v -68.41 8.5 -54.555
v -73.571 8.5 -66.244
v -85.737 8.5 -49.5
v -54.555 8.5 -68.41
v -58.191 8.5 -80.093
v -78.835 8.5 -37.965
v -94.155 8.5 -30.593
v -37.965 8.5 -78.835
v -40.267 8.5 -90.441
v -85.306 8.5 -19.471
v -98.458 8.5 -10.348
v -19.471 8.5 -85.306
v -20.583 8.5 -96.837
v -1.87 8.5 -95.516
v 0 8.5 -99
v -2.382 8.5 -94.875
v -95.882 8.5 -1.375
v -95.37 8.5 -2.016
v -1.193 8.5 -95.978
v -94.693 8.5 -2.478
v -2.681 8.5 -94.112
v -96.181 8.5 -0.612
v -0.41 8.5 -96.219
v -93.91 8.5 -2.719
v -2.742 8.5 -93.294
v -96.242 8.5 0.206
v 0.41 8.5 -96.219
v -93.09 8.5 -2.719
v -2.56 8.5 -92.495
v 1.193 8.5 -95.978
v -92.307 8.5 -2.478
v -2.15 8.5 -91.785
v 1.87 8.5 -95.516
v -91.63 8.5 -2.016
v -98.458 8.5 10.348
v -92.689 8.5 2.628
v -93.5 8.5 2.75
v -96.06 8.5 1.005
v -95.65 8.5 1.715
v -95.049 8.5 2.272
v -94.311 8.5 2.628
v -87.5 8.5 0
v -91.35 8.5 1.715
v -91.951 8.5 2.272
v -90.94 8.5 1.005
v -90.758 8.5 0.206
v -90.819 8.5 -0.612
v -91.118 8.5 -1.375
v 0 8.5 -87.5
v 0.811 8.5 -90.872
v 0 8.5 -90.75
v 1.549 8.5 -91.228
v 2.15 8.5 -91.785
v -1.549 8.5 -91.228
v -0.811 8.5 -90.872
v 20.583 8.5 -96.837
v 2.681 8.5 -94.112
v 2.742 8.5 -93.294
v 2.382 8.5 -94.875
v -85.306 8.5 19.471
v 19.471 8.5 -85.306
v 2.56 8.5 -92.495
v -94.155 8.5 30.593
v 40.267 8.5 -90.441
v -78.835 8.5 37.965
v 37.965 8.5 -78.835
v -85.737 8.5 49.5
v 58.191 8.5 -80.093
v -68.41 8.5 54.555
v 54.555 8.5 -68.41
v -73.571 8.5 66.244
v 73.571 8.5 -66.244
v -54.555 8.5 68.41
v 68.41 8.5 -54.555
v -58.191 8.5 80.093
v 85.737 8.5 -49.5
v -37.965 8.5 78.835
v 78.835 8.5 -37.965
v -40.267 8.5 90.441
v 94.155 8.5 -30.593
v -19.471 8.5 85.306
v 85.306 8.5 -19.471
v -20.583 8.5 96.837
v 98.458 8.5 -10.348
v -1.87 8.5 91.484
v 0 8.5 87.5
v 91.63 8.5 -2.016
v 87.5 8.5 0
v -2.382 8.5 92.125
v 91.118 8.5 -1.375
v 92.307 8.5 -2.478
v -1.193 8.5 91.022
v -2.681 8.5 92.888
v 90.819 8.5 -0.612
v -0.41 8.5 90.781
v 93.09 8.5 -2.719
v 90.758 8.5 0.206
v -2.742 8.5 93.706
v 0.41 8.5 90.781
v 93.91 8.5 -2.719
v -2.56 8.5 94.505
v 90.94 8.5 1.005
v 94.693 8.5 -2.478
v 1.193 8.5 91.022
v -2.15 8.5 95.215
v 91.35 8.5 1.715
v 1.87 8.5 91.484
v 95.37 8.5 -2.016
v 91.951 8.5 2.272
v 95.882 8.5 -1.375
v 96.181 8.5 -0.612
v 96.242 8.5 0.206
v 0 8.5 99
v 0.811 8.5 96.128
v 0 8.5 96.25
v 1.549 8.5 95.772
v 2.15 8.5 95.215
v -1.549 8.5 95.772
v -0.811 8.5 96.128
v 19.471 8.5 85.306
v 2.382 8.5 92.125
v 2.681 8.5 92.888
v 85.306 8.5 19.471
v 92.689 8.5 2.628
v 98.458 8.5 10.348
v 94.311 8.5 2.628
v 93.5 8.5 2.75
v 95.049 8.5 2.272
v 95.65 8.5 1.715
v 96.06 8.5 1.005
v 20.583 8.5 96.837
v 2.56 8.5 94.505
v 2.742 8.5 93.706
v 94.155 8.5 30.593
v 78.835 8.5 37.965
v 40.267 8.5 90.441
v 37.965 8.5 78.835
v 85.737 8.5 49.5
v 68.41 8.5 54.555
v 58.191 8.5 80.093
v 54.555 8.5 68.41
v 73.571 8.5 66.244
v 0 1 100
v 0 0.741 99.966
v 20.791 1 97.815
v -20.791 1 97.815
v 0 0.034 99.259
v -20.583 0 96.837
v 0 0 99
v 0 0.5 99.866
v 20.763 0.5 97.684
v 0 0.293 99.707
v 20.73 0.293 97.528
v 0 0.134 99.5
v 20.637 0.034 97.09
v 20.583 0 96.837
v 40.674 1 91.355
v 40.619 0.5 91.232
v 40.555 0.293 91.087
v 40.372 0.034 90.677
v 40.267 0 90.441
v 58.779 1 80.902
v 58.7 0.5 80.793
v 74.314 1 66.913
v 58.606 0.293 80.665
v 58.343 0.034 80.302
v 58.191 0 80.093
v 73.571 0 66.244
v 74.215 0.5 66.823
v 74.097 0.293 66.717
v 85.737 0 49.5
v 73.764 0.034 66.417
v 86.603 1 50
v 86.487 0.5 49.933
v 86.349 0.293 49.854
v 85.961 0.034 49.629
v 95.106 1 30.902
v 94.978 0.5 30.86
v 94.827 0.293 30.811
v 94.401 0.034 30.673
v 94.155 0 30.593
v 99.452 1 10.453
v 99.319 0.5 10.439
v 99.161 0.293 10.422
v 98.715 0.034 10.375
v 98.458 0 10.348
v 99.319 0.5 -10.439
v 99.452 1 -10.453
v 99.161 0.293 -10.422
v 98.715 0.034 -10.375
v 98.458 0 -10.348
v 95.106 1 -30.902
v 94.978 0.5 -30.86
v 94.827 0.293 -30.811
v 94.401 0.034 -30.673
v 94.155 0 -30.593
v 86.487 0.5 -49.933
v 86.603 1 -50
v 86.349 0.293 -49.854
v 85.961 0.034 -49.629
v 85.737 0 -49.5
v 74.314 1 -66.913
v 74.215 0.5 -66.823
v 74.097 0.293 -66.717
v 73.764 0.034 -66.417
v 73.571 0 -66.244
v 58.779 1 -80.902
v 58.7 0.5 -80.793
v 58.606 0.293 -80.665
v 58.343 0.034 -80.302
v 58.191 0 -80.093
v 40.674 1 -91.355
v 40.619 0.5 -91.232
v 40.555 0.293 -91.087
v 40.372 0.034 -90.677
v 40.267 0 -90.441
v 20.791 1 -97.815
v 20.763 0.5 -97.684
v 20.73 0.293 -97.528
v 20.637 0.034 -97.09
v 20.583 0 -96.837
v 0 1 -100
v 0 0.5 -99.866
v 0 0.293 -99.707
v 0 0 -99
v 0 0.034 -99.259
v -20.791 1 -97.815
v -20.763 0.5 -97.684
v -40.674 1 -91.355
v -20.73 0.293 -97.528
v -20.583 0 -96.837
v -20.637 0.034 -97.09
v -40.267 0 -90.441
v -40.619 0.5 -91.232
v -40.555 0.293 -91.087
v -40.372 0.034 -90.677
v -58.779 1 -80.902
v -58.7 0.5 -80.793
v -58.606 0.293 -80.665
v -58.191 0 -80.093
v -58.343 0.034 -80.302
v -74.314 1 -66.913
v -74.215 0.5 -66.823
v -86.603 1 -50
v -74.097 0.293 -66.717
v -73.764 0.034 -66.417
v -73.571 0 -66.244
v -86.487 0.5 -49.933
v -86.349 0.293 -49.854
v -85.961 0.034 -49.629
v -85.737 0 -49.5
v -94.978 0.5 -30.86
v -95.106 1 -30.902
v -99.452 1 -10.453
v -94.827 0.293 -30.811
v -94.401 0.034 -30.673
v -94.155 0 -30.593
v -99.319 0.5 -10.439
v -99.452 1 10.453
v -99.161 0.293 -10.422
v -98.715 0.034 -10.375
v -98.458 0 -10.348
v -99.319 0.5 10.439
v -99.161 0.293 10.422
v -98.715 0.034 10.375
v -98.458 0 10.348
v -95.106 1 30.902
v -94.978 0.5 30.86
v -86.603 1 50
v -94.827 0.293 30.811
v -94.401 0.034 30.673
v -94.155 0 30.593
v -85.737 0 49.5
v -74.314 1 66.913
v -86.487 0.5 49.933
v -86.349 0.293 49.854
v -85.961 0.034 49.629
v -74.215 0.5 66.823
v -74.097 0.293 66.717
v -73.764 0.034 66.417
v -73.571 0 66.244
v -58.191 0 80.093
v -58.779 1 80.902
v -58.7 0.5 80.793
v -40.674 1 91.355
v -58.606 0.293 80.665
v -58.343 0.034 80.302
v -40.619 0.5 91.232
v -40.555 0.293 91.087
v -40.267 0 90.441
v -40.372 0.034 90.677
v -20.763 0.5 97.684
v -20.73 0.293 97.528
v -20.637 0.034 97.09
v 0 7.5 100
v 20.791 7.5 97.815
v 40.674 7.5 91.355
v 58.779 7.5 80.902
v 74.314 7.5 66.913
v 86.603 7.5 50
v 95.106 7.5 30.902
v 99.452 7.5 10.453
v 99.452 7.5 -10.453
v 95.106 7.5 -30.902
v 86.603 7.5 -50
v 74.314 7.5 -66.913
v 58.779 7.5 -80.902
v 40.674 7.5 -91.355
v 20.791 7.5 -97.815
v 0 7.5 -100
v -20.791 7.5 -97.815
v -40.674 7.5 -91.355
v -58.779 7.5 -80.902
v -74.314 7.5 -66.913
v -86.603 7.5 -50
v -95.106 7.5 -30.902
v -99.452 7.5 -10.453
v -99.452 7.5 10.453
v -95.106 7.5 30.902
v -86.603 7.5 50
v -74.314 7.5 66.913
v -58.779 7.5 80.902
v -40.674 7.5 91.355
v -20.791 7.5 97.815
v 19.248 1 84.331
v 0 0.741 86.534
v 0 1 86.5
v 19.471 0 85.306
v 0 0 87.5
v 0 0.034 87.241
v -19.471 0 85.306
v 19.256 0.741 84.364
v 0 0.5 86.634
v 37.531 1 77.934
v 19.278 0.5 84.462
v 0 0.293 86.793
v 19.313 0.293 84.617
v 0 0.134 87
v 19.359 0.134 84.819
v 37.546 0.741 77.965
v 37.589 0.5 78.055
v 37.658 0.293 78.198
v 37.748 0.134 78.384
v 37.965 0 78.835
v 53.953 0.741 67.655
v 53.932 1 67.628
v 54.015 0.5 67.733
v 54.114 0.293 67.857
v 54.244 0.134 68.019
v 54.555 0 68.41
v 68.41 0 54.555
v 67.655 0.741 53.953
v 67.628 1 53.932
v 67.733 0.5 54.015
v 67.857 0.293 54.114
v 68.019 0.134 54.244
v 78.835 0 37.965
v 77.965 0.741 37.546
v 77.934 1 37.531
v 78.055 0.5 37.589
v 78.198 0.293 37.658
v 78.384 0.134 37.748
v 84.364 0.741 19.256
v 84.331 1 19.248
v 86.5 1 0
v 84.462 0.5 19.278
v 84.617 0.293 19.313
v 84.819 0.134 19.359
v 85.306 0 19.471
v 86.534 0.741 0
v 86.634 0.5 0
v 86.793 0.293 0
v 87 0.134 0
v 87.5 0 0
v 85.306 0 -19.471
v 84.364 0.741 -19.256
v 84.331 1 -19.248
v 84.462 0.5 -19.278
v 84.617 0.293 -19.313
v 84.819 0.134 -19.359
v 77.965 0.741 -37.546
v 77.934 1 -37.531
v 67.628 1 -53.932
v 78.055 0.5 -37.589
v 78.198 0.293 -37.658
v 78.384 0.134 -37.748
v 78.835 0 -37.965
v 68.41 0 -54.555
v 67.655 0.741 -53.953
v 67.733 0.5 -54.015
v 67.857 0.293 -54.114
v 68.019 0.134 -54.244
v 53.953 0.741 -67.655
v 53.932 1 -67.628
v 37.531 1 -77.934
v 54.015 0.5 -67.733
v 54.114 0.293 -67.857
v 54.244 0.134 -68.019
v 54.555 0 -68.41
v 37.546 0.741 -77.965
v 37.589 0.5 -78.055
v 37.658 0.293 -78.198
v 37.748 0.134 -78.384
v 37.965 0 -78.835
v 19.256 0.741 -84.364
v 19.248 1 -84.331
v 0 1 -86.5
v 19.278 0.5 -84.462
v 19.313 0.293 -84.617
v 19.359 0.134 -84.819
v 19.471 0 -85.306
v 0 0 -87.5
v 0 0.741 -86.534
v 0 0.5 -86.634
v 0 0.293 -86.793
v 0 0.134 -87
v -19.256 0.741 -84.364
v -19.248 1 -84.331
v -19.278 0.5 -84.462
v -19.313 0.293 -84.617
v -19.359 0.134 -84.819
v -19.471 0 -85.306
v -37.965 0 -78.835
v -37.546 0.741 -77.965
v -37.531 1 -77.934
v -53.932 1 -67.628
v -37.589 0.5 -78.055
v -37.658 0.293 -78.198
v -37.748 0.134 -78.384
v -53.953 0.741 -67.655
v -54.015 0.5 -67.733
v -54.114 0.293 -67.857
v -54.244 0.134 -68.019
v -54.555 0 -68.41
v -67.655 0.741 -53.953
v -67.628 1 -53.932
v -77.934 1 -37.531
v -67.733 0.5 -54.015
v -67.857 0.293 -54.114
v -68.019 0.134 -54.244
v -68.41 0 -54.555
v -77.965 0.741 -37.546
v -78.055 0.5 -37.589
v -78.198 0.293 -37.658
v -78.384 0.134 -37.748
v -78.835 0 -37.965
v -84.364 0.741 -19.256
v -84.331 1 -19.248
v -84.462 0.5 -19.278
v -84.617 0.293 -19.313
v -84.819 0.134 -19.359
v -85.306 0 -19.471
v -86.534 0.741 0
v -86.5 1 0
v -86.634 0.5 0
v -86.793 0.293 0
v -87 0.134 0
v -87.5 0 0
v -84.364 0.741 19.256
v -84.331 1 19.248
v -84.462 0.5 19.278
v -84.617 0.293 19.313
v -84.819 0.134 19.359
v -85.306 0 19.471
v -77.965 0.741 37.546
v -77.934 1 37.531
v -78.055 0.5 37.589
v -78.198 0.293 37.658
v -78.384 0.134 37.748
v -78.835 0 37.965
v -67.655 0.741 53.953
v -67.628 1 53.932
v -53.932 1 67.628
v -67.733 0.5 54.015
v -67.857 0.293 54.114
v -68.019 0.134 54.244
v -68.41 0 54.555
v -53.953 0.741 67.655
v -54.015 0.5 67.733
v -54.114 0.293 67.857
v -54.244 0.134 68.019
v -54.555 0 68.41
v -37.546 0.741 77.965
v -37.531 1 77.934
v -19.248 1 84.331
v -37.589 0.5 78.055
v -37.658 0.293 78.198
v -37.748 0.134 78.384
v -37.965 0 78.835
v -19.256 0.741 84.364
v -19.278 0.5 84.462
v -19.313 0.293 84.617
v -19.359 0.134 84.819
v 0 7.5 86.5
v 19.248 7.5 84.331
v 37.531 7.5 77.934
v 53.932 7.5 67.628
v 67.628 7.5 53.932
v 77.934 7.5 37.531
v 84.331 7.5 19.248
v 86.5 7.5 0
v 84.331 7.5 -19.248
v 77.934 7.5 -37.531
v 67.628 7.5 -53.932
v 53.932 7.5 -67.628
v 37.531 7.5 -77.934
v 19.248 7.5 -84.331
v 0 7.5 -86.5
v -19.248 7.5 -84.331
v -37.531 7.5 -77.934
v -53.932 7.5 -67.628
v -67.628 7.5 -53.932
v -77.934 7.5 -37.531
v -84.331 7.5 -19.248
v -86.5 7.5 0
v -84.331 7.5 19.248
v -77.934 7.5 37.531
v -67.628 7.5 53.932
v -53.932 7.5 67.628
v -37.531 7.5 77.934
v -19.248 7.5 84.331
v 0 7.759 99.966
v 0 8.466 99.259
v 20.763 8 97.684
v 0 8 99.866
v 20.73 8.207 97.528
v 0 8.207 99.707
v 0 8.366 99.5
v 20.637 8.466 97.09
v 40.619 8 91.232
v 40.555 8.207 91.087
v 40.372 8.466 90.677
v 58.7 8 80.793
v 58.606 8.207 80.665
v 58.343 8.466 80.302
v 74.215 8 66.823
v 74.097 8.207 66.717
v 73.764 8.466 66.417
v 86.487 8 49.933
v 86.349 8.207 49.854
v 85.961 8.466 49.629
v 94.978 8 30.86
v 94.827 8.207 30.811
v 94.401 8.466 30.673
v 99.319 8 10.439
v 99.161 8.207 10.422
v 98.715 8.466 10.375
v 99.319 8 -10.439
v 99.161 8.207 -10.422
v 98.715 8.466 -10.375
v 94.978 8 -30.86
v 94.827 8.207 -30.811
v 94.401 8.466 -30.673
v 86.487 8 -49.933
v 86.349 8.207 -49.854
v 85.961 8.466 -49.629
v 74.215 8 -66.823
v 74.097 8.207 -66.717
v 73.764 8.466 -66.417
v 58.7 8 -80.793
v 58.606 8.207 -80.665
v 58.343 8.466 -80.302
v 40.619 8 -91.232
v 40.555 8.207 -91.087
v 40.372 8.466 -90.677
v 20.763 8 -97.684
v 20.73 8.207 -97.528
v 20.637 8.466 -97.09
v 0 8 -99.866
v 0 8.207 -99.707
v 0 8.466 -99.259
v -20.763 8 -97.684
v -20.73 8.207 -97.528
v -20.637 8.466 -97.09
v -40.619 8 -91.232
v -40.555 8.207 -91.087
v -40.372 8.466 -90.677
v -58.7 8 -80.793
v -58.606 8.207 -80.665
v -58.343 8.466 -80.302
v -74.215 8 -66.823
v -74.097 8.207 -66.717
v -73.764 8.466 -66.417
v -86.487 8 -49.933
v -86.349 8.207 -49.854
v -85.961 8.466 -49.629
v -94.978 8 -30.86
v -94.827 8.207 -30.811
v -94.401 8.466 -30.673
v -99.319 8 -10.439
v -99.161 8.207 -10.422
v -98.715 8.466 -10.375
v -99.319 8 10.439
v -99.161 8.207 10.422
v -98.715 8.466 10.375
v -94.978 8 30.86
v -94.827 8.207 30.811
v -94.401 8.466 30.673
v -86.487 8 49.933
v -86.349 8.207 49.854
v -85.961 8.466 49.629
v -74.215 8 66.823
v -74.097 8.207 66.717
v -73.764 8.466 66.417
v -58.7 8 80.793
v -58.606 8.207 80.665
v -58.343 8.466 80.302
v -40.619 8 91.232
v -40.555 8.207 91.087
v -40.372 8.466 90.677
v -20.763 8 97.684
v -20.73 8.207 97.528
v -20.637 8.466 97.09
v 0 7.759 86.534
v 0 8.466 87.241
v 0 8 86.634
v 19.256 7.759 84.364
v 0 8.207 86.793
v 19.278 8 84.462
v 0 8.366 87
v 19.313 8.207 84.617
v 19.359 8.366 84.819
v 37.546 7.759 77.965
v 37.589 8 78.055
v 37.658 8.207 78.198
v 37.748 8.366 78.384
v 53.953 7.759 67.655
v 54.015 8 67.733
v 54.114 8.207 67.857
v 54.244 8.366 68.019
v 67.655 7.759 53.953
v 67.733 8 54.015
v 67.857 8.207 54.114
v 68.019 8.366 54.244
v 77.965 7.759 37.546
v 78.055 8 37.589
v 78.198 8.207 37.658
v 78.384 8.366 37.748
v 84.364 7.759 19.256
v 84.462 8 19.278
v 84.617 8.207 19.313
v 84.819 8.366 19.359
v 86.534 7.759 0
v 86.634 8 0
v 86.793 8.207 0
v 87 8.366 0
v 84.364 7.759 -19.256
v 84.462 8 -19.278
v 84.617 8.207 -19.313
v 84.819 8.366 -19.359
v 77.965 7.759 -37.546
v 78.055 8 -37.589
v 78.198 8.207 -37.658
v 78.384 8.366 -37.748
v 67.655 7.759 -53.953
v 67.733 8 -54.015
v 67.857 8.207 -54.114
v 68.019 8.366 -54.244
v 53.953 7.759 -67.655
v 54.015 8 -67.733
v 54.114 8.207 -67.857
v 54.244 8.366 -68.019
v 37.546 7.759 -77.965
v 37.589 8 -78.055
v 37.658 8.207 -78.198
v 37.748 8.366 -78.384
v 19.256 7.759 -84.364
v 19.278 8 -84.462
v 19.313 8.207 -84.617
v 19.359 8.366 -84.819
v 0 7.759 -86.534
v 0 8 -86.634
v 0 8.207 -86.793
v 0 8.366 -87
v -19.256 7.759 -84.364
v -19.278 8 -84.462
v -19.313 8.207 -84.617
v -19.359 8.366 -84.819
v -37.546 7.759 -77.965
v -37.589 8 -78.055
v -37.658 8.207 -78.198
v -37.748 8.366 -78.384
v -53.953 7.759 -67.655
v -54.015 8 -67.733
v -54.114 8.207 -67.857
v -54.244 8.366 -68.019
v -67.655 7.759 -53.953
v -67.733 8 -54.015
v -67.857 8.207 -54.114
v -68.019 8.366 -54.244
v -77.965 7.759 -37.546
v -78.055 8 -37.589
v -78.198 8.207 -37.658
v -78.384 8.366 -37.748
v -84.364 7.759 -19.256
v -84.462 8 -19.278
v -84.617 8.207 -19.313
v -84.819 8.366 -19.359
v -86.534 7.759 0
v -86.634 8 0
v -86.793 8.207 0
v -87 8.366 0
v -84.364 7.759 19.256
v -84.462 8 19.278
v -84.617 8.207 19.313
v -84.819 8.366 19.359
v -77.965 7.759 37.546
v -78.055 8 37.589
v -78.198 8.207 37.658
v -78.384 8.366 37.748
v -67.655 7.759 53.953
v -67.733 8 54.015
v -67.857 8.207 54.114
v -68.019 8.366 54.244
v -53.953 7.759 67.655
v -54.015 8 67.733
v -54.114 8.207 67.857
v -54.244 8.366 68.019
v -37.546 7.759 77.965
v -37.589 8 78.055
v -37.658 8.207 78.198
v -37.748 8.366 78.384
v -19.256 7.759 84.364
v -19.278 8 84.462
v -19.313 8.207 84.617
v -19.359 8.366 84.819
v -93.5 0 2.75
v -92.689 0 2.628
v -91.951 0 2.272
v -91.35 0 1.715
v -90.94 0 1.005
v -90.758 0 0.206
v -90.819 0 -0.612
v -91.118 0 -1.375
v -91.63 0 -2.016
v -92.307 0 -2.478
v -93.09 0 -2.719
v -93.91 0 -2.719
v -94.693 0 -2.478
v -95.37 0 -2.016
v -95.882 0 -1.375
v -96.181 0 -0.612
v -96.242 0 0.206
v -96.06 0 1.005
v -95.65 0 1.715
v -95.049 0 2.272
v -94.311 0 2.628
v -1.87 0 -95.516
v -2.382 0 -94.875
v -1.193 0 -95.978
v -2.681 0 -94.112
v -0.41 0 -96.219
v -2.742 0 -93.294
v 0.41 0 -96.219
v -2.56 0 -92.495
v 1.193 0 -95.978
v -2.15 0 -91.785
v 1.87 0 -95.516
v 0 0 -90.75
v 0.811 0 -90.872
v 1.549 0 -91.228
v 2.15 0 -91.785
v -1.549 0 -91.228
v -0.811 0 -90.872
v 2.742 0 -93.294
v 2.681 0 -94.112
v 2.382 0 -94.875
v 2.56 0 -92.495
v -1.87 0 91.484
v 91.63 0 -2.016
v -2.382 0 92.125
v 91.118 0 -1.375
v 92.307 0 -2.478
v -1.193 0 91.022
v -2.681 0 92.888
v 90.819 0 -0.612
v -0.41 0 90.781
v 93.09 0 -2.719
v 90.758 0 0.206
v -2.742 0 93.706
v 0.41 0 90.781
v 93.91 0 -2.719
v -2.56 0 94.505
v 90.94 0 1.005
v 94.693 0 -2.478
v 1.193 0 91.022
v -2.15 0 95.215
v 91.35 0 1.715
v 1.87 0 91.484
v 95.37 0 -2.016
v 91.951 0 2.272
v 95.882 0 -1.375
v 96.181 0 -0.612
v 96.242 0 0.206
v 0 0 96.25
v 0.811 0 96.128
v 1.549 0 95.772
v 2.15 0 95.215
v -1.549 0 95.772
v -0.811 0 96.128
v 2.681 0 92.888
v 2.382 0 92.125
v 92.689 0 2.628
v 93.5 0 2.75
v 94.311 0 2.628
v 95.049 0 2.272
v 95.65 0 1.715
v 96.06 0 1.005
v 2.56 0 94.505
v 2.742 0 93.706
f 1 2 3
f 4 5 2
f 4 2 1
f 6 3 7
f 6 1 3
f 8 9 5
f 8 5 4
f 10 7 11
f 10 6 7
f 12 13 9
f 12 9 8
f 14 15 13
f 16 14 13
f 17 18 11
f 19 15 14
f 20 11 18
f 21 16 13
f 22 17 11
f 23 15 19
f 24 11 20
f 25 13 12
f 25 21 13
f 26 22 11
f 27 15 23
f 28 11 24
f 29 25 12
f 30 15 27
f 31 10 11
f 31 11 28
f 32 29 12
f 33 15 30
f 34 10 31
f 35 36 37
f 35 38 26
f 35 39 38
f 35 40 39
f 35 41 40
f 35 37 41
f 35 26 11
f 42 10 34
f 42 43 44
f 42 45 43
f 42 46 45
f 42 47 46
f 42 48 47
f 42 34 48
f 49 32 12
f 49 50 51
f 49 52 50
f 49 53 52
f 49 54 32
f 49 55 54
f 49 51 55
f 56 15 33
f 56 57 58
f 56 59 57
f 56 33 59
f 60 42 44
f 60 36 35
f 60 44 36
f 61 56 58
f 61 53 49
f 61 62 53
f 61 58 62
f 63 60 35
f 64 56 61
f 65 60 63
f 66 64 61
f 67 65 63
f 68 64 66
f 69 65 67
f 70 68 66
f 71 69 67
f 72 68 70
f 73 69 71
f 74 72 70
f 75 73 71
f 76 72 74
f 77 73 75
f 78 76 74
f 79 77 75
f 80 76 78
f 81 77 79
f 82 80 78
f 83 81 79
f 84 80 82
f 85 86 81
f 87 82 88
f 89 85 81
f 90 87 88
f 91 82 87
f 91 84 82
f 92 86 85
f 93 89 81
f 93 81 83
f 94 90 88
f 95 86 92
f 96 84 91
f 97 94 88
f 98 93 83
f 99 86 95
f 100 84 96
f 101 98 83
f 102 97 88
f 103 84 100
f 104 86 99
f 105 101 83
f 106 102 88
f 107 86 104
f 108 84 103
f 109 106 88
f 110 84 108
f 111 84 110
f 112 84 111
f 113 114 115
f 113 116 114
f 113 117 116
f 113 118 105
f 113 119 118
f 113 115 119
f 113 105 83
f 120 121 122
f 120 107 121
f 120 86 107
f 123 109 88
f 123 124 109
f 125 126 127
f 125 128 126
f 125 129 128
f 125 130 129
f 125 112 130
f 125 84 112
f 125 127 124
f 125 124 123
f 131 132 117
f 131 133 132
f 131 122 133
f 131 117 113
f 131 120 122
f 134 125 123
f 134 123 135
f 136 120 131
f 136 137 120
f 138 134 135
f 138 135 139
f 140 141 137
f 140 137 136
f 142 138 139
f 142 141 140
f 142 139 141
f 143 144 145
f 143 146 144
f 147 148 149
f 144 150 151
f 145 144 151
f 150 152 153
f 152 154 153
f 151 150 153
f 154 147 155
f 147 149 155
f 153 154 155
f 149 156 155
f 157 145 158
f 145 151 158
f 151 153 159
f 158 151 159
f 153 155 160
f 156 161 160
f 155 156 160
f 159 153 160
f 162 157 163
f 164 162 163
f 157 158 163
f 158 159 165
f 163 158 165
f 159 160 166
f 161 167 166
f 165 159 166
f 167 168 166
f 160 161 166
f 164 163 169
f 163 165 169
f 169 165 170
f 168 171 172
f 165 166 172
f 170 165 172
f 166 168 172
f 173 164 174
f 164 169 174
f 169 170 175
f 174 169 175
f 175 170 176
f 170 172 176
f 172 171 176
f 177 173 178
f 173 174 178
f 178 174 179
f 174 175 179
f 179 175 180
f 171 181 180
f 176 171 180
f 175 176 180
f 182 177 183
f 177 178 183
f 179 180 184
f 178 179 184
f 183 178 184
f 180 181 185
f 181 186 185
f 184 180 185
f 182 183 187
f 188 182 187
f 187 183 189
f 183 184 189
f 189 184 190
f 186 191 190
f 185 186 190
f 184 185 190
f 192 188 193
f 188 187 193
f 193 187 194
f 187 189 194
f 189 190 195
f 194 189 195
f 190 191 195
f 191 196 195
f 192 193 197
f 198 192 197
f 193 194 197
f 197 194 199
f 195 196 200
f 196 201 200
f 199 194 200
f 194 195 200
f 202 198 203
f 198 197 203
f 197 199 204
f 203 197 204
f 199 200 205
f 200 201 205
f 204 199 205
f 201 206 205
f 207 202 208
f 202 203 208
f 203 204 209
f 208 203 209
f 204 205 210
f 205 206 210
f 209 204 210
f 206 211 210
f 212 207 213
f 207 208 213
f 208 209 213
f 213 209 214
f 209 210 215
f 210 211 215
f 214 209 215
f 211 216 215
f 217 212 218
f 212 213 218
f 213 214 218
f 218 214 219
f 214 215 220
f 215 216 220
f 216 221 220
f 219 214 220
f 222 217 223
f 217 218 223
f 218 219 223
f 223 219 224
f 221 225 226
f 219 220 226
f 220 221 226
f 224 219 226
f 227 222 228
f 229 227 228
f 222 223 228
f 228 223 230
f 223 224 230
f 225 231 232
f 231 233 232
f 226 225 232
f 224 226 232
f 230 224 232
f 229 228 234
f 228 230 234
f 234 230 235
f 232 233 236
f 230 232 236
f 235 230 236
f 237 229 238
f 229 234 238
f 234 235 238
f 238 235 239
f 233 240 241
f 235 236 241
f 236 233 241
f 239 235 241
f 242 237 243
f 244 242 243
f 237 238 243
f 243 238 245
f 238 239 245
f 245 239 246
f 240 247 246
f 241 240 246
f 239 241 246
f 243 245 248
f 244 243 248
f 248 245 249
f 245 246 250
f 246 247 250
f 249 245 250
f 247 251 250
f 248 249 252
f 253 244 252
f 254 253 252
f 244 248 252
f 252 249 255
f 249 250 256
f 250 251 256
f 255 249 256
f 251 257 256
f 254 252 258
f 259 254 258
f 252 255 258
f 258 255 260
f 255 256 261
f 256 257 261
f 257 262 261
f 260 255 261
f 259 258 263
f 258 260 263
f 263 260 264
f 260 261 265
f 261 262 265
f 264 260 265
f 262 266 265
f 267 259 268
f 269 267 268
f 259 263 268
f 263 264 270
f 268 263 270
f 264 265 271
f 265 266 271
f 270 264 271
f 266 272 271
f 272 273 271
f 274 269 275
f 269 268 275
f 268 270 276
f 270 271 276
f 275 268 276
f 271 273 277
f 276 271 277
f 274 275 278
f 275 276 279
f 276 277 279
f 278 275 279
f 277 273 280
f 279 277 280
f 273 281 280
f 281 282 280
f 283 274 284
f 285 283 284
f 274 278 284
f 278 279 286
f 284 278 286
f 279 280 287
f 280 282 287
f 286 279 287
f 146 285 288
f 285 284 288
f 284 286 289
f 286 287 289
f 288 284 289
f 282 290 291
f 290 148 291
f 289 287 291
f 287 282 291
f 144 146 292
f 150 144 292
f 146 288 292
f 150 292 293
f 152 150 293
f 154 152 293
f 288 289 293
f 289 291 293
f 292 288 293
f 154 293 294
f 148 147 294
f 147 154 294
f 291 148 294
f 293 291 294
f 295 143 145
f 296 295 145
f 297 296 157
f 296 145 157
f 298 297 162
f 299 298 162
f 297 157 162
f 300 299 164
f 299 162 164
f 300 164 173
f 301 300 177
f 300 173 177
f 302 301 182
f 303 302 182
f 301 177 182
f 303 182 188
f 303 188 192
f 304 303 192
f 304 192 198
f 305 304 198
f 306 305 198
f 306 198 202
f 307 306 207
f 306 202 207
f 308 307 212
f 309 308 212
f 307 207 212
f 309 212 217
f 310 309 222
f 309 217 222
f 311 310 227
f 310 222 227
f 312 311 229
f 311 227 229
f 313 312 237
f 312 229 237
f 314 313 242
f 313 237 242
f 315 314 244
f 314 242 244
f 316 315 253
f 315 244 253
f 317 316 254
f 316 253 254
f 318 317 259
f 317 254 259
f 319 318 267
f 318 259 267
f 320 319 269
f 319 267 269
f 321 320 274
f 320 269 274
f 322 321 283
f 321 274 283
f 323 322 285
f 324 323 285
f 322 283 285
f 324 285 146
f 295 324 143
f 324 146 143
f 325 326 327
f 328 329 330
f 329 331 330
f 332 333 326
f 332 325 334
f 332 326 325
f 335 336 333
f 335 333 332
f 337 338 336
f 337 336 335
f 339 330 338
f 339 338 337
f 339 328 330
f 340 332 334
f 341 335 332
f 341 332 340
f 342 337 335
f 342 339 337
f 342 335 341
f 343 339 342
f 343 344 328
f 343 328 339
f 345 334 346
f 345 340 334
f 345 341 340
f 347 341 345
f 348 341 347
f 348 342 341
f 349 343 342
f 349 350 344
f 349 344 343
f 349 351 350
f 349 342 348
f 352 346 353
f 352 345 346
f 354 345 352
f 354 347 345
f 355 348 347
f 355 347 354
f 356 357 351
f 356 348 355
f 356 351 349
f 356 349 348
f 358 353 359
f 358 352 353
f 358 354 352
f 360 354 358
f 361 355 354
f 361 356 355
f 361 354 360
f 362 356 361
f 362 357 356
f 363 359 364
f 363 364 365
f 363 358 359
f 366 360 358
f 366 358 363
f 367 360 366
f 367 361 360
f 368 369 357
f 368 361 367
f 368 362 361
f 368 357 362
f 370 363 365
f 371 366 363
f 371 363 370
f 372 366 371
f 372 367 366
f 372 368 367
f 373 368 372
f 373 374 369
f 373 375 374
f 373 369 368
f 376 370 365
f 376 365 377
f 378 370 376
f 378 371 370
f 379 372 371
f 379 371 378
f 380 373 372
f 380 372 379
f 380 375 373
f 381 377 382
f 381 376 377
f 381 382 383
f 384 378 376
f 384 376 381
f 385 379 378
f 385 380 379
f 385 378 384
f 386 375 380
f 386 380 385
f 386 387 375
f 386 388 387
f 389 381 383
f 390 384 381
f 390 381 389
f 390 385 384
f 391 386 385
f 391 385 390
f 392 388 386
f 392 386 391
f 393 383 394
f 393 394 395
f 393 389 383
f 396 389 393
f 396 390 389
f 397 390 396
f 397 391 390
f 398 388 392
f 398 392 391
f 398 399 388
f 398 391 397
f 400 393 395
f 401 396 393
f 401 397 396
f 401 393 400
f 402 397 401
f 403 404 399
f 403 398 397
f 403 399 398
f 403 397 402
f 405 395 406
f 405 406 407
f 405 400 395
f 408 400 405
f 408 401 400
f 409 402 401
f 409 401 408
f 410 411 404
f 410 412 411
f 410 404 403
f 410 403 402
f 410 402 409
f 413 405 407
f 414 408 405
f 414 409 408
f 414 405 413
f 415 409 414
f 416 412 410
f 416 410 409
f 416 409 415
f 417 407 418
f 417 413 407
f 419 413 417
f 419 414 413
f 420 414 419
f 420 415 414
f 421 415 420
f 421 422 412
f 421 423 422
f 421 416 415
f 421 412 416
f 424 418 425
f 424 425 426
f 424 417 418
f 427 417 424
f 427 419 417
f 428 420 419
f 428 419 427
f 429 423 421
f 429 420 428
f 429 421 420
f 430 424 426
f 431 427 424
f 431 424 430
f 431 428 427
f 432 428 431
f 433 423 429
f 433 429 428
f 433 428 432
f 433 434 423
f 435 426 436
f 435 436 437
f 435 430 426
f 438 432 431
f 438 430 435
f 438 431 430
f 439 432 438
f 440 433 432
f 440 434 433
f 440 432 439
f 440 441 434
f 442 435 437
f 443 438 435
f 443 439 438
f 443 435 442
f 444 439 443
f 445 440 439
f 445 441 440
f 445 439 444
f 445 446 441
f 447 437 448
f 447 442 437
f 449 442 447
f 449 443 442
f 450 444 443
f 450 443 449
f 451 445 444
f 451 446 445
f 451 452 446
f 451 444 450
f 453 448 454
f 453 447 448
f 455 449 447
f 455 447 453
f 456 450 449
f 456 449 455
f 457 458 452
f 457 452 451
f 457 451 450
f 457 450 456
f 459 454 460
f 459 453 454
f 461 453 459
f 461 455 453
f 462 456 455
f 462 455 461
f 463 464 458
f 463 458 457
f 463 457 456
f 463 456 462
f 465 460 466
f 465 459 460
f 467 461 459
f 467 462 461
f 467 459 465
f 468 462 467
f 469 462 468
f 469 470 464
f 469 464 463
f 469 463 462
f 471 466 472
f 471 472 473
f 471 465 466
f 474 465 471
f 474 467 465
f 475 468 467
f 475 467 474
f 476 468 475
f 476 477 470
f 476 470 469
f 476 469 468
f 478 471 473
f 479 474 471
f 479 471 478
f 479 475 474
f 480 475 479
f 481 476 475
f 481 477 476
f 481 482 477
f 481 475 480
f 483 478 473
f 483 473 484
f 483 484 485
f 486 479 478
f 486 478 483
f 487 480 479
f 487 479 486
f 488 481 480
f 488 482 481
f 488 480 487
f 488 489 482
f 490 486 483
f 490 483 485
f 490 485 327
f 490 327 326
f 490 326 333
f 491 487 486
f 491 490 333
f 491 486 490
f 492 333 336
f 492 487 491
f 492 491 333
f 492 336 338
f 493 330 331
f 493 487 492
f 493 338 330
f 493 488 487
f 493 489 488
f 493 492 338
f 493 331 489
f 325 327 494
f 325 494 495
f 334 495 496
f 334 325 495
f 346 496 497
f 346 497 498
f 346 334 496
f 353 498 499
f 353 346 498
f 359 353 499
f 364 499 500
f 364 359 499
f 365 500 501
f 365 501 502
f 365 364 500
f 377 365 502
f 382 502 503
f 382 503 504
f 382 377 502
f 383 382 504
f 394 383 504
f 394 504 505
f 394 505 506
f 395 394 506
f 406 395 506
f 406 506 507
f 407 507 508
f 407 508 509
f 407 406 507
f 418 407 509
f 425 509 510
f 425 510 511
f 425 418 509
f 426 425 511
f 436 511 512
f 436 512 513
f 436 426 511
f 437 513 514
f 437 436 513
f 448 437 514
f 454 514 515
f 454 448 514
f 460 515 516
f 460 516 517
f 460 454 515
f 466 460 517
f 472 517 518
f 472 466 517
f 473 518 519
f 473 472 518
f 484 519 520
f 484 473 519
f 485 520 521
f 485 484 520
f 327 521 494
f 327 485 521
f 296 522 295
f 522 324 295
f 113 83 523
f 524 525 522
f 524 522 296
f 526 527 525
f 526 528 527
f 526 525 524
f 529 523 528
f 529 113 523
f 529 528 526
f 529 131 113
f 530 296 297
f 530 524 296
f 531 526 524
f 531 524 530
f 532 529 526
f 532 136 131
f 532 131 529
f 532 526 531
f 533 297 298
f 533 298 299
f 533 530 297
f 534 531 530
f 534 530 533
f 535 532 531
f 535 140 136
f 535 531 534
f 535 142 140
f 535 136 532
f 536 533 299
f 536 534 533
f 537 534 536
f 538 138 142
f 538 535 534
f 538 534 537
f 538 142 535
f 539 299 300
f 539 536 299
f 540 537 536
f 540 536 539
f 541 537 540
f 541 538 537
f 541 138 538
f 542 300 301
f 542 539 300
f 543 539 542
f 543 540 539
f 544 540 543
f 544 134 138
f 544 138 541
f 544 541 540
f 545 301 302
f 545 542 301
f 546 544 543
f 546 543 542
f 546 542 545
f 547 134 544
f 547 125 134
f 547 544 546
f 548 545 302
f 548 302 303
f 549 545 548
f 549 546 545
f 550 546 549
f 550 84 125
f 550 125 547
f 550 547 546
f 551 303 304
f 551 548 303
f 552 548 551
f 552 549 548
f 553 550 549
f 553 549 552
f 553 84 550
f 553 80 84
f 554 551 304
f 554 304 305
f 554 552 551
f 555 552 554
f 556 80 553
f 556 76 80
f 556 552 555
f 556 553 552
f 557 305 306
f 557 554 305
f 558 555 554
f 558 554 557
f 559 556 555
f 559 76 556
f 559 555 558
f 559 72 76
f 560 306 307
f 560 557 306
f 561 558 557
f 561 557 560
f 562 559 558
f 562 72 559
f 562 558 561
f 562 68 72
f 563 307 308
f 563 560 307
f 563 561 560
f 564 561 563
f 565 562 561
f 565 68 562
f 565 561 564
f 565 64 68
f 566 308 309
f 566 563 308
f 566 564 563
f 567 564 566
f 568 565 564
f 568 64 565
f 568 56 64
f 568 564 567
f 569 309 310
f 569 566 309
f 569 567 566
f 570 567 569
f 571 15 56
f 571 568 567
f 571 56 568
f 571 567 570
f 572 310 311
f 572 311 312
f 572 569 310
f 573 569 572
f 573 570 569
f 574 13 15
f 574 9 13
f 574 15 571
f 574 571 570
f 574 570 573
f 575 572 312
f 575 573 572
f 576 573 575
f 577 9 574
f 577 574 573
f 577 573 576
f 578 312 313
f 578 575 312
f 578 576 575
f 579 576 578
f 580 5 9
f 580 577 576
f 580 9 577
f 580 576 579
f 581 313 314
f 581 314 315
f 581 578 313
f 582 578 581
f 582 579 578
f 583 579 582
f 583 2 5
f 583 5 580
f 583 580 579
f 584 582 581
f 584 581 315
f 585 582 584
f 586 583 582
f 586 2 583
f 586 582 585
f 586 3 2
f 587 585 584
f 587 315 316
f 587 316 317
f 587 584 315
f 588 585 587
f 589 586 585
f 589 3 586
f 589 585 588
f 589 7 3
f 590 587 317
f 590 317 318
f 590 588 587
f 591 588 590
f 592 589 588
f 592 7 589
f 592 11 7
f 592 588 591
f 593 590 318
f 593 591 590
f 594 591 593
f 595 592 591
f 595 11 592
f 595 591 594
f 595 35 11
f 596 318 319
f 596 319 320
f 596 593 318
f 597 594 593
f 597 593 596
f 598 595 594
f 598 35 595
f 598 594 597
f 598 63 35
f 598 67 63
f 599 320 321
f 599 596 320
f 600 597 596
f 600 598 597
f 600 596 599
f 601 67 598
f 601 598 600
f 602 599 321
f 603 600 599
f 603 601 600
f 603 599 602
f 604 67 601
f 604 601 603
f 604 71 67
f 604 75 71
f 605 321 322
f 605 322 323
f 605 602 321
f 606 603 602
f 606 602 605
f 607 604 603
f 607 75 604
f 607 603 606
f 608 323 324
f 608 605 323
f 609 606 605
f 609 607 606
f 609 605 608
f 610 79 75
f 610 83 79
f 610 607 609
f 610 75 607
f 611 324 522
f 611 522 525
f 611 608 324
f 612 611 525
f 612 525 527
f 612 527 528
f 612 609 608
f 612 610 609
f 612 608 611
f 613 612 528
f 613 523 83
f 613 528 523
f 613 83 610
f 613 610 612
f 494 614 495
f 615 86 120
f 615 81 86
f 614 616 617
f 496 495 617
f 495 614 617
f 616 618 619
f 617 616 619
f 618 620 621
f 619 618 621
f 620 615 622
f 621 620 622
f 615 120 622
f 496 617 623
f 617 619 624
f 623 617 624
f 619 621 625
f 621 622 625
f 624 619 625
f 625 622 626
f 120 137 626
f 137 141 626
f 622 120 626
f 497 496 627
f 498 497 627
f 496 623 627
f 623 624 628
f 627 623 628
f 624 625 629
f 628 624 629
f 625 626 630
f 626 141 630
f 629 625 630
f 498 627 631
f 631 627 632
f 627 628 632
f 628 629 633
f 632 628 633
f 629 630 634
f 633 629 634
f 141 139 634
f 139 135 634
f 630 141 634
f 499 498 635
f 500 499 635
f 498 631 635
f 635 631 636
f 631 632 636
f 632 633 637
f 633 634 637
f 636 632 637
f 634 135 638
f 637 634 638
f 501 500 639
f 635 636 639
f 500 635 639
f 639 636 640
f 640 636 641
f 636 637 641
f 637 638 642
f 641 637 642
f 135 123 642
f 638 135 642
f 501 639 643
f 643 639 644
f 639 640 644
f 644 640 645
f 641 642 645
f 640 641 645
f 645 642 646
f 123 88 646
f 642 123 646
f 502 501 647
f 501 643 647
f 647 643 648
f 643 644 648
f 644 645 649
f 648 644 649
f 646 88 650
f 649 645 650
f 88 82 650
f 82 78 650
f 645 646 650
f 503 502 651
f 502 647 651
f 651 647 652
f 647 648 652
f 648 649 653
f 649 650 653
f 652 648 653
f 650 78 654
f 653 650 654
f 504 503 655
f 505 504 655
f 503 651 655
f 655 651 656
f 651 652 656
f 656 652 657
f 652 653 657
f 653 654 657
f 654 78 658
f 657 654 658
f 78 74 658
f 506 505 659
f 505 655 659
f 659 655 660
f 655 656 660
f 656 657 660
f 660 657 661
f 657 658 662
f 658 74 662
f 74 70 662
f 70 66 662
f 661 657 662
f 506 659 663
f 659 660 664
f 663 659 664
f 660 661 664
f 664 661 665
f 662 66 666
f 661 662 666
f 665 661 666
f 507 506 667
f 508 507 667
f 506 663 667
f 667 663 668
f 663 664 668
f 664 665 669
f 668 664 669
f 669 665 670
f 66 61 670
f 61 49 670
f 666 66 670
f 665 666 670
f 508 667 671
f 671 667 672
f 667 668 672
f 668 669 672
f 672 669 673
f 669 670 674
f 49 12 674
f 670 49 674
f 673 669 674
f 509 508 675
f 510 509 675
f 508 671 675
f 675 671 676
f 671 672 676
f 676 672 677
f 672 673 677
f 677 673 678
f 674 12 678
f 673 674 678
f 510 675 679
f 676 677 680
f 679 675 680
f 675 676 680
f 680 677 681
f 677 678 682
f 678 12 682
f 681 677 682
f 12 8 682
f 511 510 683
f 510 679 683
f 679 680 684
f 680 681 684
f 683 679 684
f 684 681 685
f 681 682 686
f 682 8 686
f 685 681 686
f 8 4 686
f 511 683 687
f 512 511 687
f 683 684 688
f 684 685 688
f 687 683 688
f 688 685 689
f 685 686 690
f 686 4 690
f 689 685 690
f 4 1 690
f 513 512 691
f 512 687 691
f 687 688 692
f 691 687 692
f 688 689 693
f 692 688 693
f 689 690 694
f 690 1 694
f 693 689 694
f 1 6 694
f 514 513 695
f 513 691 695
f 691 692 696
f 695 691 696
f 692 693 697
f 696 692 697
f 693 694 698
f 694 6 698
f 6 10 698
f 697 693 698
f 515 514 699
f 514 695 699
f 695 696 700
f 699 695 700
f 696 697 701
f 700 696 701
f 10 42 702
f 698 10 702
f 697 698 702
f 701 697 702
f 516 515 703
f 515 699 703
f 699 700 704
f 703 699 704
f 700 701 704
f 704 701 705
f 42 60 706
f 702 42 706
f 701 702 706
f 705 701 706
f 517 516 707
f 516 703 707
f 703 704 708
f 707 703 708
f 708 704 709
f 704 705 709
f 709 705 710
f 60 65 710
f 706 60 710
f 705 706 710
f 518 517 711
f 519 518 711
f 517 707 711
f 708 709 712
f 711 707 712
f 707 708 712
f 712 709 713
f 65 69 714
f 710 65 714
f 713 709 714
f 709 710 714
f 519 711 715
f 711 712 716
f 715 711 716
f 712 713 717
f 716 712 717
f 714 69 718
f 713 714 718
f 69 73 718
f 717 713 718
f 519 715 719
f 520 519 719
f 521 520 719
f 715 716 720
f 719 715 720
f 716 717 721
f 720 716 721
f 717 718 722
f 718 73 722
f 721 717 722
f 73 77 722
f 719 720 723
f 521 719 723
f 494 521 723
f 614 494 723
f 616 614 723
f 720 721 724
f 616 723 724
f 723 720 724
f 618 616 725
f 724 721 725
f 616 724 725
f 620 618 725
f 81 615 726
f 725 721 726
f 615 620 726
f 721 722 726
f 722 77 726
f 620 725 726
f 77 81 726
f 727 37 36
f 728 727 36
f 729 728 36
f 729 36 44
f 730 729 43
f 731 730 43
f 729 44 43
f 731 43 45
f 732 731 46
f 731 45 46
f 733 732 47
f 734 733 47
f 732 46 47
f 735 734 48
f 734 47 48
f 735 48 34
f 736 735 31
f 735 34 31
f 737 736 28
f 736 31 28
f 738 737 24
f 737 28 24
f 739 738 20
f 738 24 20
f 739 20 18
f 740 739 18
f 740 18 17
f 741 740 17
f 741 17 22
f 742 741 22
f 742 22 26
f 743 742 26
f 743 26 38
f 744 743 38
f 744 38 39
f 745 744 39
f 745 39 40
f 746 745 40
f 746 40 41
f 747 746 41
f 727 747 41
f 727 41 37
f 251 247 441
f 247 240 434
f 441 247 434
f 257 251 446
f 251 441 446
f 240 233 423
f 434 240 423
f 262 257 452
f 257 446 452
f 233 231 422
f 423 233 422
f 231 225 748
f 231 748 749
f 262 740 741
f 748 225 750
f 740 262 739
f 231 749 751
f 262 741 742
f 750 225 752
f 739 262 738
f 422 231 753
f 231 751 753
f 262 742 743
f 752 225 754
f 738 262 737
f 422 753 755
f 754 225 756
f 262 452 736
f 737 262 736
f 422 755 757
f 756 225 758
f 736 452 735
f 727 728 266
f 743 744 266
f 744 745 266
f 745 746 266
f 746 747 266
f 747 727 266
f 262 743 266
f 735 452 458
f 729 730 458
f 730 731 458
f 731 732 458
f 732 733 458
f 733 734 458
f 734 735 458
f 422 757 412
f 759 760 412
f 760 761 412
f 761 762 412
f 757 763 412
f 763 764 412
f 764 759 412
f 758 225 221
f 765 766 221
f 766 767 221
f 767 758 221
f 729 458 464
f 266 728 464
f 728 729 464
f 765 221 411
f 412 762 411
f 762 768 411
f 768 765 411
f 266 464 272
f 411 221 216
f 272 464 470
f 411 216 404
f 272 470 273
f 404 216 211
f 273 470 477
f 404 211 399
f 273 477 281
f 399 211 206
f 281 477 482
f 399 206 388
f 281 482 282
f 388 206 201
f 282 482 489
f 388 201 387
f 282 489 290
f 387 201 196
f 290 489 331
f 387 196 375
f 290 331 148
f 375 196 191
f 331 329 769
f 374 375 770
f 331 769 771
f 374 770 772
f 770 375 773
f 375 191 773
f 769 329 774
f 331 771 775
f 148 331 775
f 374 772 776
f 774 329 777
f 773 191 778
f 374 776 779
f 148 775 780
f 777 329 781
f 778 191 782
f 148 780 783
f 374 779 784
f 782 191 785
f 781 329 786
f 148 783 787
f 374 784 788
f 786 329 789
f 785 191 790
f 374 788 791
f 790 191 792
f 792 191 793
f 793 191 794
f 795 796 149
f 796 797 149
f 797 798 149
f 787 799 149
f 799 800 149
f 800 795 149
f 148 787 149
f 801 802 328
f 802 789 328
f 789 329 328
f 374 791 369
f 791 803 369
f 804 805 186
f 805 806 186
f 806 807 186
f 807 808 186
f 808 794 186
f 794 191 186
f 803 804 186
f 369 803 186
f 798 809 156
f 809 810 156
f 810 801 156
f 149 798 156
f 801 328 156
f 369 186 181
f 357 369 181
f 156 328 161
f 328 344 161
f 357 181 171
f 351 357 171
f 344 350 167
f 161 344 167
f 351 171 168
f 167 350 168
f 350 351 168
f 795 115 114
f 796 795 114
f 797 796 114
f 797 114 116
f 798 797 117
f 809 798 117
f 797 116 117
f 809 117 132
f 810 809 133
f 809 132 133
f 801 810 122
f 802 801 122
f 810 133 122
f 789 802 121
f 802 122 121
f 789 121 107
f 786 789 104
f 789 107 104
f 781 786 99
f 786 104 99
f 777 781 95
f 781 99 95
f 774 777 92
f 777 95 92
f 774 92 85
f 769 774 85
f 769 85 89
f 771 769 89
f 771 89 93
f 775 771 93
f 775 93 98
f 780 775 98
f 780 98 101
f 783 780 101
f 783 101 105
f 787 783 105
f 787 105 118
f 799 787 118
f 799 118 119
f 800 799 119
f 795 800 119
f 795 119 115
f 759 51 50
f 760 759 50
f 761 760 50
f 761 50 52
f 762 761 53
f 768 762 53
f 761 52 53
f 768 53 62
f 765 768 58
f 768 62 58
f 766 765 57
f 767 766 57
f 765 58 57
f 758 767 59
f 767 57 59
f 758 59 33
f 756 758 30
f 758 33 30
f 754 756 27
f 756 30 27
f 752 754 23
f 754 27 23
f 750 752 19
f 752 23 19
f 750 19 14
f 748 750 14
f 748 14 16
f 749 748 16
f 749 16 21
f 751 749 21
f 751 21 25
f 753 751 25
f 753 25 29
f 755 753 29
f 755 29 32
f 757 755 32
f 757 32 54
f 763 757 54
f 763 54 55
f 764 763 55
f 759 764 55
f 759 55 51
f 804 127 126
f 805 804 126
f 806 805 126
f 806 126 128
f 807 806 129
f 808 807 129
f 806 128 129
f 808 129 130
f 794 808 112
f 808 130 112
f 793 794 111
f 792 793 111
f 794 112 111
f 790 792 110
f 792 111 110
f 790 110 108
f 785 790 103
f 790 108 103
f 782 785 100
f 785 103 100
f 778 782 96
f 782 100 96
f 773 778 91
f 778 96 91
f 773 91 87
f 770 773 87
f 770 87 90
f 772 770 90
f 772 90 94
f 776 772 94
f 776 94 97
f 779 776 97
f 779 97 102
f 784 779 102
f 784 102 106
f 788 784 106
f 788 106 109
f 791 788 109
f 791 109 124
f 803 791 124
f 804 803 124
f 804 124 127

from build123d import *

# Parameters (mm, degrees)
SKETCH1_R           = 100
SKETCH1_R_2         = 86.5
BOSS_EXTRUDE1_DEPTH = 8.5
FILLET1_R           = 1
SKETCH2_R           = 2.75
CUT_EXTRUDE1_DEPTH  = 142.676568423


with BuildPart() as part:
    # Sketch1 → Boss-Extrude1 (new body)
    with BuildSketch(Plane(origin=(0, 0, 0), x_dir=(1, 0, 0), z_dir=(0, 1, 0))):
        with Locations(Location((0, 0, 0), (0, 0, 270))):
            Circle(SKETCH1_R)
        with Locations(Location((0, 0, 0), (0, 0, 270))):
            Circle(SKETCH1_R_2, mode=Mode.SUBTRACT)
    extrude(amount=BOSS_EXTRUDE1_DEPTH)

    # Fillet1
    fillet1_edges = [part.edges().sort_by_distance(p)[0] for p in [
        (0, 0, -100),
        (0, 8.5, -100),
        (0, 0, -86.5),
        (0, 8.5, -86.5),
    ]]
    fillet(fillet1_edges, radius=FILLET1_R)

    # Sketch2 → Cut-Extrude1 (cut, through all)
    with BuildSketch(Plane(origin=(0, 8.5, 0), x_dir=(1, 0, 0), z_dir=(0, 1, 0))):
        with Locations(Location((0, 93.5, 0), (0, 0, 270))):
            Circle(SKETCH2_R)
        with Locations(Location((93.5, 0, 0), (0, 0, 270))):
            Circle(SKETCH2_R)
        with Locations(Location((0, -93.5, 0), (0, 0, 270))):
            Circle(SKETCH2_R)
        with Locations(Location((-93.5, 0, 0), (0, 0, 270))):
            Circle(SKETCH2_R)
    extrude(amount=-CUT_EXTRUDE1_DEPTH, mode=Mode.SUBTRACT)


solid = part.part
